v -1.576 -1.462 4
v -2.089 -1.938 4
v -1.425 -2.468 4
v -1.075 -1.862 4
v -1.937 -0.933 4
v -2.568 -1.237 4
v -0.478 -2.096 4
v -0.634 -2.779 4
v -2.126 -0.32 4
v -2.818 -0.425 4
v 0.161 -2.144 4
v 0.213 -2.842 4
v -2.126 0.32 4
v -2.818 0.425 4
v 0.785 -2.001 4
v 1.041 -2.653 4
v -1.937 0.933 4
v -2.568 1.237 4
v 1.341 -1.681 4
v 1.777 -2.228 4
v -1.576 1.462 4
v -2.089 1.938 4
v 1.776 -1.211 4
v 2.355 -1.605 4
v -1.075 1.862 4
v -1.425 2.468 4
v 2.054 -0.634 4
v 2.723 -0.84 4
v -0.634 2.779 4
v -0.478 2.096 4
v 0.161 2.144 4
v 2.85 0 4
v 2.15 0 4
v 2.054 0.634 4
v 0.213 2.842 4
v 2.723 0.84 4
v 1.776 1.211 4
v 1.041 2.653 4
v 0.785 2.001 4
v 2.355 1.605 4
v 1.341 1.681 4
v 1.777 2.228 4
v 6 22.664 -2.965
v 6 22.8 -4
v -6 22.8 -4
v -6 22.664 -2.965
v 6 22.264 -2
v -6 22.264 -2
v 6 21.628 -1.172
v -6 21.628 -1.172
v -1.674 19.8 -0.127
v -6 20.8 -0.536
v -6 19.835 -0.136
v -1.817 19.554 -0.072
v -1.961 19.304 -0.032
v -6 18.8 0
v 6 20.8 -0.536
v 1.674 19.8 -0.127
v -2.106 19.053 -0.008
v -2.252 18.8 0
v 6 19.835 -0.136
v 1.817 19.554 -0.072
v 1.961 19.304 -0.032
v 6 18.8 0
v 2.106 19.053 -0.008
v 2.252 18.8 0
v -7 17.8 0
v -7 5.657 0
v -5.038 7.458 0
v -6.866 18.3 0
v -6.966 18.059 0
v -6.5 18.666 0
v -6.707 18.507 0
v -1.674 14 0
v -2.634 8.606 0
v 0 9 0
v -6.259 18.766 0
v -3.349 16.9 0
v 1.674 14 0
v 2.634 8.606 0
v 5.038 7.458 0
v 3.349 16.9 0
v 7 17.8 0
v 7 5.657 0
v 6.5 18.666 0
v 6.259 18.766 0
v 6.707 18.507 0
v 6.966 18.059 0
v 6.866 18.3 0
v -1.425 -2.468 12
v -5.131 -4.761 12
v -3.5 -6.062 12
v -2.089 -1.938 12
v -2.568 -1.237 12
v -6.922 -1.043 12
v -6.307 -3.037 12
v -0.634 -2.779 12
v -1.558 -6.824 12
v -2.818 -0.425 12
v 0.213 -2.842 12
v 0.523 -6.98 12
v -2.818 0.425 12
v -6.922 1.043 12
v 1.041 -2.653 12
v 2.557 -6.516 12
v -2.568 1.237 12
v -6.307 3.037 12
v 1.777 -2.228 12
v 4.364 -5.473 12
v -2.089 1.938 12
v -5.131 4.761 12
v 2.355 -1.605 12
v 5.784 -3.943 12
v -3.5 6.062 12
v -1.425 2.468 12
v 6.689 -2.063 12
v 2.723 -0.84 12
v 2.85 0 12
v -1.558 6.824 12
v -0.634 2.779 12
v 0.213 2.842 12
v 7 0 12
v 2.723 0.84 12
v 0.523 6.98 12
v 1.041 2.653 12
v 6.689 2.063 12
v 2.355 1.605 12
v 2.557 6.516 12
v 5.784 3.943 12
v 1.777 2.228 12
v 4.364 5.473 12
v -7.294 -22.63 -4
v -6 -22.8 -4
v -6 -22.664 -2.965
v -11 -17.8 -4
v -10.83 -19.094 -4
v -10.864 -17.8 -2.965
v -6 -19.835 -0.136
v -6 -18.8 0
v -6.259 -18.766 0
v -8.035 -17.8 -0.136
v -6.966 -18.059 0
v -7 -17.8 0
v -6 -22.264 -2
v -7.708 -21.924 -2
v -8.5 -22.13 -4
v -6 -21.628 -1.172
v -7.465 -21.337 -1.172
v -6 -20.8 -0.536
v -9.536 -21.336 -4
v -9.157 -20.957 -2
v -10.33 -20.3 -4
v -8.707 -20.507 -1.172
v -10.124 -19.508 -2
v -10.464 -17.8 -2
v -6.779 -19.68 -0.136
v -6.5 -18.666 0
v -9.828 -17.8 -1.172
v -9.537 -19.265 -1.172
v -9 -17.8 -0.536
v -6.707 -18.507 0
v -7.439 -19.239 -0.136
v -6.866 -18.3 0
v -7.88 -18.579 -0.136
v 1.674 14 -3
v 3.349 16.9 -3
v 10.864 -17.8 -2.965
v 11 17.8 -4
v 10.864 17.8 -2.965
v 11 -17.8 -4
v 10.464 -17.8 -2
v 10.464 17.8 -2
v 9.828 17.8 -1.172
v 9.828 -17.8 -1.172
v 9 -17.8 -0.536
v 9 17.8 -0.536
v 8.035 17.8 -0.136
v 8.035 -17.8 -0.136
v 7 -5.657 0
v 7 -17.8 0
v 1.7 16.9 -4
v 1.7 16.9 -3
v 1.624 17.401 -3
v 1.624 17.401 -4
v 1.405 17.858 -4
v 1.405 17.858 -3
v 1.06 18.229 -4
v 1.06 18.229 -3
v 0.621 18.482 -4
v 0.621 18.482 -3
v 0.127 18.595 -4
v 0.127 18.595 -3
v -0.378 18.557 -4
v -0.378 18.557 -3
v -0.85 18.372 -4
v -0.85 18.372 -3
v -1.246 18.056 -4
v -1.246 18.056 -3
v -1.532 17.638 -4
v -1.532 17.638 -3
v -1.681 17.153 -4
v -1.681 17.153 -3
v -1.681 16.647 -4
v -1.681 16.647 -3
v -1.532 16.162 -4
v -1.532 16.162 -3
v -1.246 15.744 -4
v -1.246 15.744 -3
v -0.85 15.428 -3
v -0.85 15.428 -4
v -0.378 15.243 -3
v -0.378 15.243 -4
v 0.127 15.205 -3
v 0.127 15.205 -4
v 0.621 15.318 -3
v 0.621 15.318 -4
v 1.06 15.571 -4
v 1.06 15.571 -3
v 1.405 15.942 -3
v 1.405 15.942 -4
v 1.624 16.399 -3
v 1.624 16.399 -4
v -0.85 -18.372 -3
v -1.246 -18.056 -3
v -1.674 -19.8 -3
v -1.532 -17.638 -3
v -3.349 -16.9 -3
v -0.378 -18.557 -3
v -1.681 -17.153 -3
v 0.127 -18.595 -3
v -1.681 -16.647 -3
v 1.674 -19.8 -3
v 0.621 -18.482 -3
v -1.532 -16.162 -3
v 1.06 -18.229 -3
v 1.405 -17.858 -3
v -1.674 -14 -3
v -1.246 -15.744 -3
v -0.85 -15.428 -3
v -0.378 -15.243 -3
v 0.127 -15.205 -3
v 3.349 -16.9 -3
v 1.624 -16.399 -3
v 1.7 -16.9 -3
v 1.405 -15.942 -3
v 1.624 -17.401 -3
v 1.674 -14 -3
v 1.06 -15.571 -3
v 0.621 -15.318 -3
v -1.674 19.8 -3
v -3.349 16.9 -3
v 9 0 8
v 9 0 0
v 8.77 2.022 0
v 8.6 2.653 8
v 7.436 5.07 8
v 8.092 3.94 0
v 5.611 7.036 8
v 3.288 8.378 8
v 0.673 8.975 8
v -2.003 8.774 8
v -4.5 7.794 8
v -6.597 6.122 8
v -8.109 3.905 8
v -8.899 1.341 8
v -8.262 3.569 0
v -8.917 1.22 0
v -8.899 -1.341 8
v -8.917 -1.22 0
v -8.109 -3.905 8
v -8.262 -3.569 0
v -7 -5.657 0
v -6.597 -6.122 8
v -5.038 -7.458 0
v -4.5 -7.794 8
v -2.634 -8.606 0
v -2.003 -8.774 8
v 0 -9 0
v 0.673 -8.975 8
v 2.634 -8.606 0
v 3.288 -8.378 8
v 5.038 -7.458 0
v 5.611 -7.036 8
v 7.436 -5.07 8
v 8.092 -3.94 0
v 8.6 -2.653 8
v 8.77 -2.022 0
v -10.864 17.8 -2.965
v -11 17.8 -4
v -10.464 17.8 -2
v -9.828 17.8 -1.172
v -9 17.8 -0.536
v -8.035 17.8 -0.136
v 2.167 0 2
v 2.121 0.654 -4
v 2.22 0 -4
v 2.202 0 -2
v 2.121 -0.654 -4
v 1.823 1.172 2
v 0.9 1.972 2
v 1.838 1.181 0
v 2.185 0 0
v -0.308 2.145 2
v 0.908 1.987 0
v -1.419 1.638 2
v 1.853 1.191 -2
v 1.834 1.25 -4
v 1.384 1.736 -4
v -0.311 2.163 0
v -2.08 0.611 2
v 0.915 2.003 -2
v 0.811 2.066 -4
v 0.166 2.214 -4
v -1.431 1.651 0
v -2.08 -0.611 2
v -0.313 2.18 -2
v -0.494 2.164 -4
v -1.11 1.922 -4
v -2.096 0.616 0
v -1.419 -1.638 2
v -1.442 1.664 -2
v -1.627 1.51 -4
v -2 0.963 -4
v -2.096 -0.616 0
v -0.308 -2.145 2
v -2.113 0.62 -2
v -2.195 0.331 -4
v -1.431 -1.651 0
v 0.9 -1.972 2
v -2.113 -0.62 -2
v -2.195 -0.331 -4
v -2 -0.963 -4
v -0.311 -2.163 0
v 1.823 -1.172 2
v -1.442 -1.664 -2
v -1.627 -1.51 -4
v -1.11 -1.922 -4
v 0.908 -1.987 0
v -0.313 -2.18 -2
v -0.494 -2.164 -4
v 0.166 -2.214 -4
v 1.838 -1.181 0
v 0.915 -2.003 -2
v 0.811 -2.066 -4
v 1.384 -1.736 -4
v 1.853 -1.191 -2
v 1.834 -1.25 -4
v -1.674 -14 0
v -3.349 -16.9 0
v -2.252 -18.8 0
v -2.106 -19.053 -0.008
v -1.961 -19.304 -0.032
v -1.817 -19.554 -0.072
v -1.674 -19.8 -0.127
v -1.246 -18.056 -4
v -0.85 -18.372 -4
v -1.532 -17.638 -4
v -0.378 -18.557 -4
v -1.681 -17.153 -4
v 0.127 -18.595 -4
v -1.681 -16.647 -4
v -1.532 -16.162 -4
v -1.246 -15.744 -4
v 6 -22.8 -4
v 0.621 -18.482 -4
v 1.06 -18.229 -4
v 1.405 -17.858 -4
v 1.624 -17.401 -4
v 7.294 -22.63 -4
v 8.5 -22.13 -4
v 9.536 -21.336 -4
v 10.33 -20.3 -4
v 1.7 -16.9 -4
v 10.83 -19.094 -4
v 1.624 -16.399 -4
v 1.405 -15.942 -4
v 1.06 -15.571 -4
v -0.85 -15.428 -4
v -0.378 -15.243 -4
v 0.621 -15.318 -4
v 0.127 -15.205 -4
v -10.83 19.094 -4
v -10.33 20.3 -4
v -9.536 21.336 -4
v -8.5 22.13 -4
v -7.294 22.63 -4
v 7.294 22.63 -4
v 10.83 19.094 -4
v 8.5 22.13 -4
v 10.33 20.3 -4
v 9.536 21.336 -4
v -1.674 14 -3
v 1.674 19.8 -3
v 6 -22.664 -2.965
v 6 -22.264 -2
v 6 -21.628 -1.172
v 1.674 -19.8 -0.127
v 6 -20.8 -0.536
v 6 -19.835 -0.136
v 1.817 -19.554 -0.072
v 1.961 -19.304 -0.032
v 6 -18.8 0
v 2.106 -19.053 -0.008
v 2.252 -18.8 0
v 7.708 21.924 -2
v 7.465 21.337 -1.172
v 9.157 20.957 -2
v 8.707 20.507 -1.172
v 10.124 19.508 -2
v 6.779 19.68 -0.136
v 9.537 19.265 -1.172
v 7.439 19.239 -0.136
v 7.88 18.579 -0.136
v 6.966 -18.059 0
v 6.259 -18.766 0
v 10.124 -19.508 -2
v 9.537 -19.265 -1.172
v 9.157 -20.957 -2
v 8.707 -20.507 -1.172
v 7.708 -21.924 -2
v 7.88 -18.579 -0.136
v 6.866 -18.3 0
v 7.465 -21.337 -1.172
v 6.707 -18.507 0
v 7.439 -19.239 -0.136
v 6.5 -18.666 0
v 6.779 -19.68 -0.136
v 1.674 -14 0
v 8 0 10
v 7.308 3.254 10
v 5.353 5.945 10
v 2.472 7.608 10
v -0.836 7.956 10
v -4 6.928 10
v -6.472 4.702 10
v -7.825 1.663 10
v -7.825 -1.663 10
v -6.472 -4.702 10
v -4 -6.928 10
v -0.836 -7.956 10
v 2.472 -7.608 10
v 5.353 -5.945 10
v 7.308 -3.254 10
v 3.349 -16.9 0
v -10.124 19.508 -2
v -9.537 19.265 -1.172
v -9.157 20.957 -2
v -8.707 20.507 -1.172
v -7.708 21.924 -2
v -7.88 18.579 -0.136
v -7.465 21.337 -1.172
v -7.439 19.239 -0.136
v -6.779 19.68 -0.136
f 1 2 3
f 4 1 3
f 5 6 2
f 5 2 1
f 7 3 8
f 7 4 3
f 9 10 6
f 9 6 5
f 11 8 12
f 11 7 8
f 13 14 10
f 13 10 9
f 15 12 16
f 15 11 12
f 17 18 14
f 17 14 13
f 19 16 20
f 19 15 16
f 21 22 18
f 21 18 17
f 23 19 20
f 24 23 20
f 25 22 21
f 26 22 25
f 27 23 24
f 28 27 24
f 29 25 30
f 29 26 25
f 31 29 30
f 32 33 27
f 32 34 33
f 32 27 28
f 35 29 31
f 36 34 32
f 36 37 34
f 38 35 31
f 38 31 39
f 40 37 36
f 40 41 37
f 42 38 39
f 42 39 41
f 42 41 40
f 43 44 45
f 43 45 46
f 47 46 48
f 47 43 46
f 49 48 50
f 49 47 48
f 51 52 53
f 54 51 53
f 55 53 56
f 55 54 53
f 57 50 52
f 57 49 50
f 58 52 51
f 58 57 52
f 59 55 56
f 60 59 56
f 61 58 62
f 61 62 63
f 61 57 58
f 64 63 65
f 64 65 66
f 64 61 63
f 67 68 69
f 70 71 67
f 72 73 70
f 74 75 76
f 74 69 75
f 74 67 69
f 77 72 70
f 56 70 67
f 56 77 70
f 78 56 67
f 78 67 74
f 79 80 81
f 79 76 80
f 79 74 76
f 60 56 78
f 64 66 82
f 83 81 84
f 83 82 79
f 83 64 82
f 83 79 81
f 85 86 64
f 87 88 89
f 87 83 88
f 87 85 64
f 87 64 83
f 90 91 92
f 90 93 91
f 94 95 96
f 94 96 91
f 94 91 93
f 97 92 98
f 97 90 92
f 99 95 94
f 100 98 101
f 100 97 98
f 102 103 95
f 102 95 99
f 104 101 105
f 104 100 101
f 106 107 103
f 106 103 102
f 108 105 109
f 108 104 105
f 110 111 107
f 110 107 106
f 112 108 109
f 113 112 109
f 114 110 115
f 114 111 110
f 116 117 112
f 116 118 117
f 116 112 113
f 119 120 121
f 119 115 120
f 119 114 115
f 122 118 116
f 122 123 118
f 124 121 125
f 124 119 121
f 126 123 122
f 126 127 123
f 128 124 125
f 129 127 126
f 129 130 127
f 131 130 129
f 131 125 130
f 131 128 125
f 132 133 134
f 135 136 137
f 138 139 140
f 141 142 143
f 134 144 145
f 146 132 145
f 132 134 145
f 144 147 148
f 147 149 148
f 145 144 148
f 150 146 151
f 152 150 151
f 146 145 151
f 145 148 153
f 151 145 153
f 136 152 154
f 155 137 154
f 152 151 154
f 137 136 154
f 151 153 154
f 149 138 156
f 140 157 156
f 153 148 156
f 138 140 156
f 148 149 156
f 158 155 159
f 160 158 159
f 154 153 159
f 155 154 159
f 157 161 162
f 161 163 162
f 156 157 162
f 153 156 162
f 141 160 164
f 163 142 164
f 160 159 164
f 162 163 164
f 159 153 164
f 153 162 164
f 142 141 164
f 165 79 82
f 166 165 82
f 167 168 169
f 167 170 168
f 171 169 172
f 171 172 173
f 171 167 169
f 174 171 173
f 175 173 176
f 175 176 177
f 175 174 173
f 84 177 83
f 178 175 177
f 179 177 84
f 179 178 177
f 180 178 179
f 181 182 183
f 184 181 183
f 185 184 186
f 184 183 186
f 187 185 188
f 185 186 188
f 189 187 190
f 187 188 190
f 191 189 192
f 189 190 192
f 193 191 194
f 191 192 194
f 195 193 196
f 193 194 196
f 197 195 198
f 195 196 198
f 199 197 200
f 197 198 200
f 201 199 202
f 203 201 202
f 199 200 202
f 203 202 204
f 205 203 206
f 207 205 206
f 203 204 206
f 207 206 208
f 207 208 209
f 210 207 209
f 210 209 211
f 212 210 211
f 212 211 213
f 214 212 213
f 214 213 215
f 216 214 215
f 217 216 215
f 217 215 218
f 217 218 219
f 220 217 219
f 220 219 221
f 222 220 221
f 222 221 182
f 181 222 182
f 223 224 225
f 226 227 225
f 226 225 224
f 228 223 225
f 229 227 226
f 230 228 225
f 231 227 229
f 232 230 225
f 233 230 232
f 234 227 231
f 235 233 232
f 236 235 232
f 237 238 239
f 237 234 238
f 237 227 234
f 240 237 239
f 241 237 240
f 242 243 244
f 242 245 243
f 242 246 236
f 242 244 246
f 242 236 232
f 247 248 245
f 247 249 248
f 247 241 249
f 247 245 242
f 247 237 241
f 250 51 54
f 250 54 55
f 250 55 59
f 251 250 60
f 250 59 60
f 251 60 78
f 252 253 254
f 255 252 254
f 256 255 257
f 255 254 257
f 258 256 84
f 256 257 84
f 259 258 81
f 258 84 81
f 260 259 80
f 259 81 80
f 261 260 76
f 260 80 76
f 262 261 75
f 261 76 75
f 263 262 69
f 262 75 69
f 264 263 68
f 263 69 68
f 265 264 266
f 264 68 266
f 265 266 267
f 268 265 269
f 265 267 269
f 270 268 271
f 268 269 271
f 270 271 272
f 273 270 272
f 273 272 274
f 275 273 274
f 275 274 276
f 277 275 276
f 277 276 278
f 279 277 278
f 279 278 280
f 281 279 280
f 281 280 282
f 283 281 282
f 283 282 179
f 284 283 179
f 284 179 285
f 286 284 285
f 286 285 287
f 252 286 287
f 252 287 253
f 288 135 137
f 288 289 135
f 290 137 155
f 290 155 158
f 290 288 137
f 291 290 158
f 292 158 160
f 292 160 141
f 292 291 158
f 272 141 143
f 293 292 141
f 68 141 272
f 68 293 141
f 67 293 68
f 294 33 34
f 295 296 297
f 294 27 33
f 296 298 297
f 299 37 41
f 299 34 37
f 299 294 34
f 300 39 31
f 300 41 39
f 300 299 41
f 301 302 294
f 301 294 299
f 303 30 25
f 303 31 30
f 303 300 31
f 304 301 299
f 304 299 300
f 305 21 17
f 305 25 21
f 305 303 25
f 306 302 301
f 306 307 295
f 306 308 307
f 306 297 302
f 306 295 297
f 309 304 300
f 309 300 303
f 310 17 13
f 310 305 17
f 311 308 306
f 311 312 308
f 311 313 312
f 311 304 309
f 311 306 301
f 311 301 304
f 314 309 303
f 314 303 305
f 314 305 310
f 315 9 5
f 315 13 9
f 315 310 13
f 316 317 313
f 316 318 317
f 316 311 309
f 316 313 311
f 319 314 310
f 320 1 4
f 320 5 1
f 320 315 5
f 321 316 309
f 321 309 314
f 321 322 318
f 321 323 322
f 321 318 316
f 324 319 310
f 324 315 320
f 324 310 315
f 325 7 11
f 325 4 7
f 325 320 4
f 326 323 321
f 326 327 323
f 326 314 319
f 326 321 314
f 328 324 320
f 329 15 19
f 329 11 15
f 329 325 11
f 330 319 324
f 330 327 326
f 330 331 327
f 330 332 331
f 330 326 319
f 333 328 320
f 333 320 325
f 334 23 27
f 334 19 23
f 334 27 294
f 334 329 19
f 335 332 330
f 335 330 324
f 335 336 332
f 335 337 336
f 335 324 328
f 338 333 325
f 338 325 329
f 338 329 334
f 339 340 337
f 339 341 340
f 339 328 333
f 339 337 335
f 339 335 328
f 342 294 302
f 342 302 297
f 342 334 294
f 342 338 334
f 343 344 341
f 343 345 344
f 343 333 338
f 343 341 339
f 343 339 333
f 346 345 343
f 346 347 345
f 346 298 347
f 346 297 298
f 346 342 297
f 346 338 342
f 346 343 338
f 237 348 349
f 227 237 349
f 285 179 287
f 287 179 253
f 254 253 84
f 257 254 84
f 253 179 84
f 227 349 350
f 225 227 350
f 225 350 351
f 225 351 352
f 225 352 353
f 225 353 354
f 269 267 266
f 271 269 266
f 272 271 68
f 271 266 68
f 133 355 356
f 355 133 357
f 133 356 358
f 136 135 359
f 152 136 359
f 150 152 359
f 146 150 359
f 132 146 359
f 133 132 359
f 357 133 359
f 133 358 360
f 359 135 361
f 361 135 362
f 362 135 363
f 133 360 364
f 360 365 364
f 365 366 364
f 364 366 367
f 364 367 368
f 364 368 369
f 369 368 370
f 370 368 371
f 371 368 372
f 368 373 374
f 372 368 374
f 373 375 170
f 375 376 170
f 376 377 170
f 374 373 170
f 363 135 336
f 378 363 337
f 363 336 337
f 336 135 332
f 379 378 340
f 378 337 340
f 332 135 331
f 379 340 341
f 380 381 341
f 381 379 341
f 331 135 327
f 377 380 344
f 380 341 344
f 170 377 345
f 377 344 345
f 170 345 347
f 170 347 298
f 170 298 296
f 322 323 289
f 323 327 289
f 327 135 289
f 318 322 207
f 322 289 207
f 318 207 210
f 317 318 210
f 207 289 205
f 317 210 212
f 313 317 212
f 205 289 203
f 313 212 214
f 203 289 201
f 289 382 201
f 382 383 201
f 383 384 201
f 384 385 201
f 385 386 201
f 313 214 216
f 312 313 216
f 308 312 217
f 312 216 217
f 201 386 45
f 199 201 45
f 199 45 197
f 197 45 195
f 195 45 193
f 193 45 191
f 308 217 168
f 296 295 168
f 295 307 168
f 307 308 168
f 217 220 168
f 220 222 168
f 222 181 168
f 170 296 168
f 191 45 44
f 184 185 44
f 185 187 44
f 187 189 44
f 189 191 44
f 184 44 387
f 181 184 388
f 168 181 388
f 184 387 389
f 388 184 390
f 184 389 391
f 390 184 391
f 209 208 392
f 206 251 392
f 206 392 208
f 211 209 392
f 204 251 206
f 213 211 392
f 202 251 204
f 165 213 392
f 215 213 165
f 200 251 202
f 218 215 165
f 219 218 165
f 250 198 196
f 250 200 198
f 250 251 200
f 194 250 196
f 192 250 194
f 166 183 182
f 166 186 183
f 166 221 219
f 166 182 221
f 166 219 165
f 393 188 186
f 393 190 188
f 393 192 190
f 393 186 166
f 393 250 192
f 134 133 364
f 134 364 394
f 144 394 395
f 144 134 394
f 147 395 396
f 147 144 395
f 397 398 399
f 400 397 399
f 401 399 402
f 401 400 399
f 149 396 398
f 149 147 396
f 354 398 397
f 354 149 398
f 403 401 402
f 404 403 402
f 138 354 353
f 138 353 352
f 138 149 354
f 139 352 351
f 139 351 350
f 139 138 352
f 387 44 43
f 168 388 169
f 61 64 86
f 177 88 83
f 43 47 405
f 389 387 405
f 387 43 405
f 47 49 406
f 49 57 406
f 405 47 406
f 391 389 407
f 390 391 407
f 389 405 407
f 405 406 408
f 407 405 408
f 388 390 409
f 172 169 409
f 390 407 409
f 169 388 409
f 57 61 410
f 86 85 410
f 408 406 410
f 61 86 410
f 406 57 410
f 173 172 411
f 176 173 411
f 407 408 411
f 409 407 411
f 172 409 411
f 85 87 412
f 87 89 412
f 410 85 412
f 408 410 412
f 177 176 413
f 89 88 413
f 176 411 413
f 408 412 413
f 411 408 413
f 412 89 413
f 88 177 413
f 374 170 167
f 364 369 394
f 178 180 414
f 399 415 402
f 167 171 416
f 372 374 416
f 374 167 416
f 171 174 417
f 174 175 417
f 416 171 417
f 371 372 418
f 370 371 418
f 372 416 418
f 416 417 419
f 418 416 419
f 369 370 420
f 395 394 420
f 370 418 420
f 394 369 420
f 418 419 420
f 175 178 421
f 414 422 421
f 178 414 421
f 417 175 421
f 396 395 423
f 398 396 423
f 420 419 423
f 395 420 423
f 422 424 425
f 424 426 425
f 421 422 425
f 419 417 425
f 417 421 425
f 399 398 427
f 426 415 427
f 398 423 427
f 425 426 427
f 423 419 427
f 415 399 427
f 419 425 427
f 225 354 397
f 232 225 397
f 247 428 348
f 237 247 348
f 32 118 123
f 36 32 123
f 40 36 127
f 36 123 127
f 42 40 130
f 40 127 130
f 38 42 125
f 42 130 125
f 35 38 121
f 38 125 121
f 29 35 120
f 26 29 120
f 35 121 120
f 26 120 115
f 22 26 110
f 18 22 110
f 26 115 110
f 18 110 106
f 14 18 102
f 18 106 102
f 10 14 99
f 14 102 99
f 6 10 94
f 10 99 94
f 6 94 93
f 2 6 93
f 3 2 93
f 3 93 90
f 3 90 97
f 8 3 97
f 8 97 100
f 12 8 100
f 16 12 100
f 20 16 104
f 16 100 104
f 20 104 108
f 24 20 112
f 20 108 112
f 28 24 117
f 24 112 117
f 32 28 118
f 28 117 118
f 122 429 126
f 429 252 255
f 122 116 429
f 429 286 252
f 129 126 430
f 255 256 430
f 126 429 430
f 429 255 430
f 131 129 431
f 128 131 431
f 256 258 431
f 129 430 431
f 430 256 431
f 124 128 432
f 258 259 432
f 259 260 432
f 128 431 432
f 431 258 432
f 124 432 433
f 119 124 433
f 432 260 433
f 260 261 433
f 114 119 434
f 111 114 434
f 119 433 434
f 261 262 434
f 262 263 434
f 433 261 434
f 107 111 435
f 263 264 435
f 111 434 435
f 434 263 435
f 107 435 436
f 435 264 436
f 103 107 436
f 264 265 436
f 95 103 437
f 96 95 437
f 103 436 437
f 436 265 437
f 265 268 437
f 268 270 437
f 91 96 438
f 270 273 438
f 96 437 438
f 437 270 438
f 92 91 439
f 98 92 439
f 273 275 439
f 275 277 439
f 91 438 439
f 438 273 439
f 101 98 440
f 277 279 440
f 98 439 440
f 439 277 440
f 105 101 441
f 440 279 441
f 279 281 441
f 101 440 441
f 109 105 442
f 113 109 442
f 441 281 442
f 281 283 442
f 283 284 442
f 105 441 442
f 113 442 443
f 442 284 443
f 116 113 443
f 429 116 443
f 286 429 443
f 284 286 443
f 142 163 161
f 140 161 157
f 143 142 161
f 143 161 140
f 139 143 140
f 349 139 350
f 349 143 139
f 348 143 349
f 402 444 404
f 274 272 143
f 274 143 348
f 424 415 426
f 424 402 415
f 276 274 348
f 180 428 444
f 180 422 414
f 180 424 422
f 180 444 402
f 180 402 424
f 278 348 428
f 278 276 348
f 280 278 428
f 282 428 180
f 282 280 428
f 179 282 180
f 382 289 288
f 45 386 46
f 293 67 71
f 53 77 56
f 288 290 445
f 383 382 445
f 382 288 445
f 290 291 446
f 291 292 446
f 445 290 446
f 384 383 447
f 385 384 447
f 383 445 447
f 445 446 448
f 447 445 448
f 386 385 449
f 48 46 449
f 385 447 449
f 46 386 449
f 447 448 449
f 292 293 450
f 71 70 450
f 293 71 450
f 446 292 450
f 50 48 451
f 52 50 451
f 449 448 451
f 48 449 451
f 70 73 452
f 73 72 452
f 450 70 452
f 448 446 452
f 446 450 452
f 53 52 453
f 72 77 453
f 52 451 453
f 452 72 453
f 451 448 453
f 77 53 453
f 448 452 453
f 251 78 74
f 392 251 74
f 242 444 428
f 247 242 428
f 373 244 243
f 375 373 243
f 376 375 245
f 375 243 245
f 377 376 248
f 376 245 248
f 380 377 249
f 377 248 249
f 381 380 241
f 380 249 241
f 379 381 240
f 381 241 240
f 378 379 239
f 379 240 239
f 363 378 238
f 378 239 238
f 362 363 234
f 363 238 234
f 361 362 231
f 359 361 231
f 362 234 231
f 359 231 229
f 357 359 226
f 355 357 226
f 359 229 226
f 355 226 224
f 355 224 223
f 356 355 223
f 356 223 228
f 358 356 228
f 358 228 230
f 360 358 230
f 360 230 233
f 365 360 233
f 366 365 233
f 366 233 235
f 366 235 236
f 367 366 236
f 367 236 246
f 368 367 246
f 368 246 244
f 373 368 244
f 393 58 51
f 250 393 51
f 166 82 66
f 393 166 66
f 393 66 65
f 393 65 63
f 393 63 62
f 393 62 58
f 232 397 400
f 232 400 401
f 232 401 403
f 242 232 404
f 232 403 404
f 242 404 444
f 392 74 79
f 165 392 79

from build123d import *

# Parameters (mm, degrees)
F2_W      = 22
F2_H      = 45.6
F2_R      = 1.7
F3_DEPTH  = 4
F4_R      = 5
F5_R      = 3.99999
F6_DEPTH  = 3
F8_R      = 9
F9_DEPTH  = 12
F10_R     = 2.85
F11_DEPTH = 8
F12_R     = 2.15
F13_DEPTH = 8
F13_TAPER = -0.5
F14_SIZE2 = 4
F14_SIZE  = 2


# Not quite as in the source:
# - a fillet or chamfer is up to 0.001 mm smaller than in the source, because OpenCascade refuses the exact size
# - a feature names something its author has since deleted; it is built from what else it names


with BuildPart() as f3:
    # F2 (on Top) → F3 (new body)
    with BuildSketch(Plane.XY):
        Rectangle(F2_W, F2_H)
        Polygon((3.3486315613, -16.9), (1.6743157806, -19.8), (-1.6743157806, -19.8), (-3.3486315613, -16.9), (-1.6743157806, -14), (1.6743157806, -14), align=None, mode=Mode.SUBTRACT)
        Circle(F2_R, mode=Mode.SUBTRACT)
        Polygon((1.6743157806, 19.8), (3.3486315613, 16.9), (1.6743157806, 14), (-1.6743157806, 14), (-3.3486315613, 16.9), (-1.6743157806, 19.8), align=None, mode=Mode.SUBTRACT)
        Polygon((1.6743157806, 14), (3.3486315613, 16.9), (1.6743157806, 19.8), (-1.6743157806, 19.8), (-3.3486315613, 16.9), (-1.6743157806, 14), align=None)
        with Locations((0, 16.9)):
            Circle(F2_R, mode=Mode.SUBTRACT)
        Circle(F2_R)
        Polygon((-1.6743157806, -19.8), (1.6743157806, -19.8), (3.3486315613, -16.9), (1.6743157806, -14), (-1.6743157806, -14), (-3.3486315613, -16.9), align=None)
        with Locations((0, -16.9)):
            Circle(F2_R, mode=Mode.SUBTRACT)
    extrude(amount=-F3_DEPTH)

    # F4
    f4_edges = [f3.edges().sort_by_distance(p)[0] for p in [
        (-11, 22.8, -2),
        (11, 22.8, -2),
        (11, -22.8, -2),
        (-11, -22.8, -2),
    ]]
    fillet(f4_edges, radius=F4_R)

    # F5 (radius 4 in the source; OpenCascade refuses exactly that, so slightly less here)
    f5_edges = [f3.edges().sort_by_distance(p)[0] for p in [
        (-11, 0, 0),
        (0, -22.8, 0),
        (-9.535534, -21.335534, 0),
        (9.535534, -21.335534, 0),
        (11, 0, 0),
        (9.535534, 21.335534, 0),
        (0, 22.8, 0),
        (-9.535534, 21.335534, 0),
    ]]
    fillet(f5_edges, radius=F5_R)

    # F2 (on Top) → F6 (cut)
    with BuildSketch(Plane.XY):
        Polygon((1.6743157806, 14), (3.3486315613, 16.9), (1.6743157806, 19.8), (-1.6743157806, 19.8), (-3.3486315613, 16.9), (-1.6743157806, 14), align=None)
        with Locations((0, 16.9)):
            Circle(F2_R, mode=Mode.SUBTRACT)
        Polygon((-1.6743157806, -19.8), (1.6743157806, -19.8), (3.3486315613, -16.9), (1.6743157806, -14), (-1.6743157806, -14), (-3.3486315613, -16.9), align=None)
        with Locations((0, -16.9)):
            Circle(F2_R, mode=Mode.SUBTRACT)
    extrude(amount=-F6_DEPTH, mode=Mode.SUBTRACT)

    # F8 (on line) → F9 (join)
    with BuildSketch(Plane.XY):
        Circle(F8_R)
    extrude(amount=F9_DEPTH)

    # F10 (on face) → F11 (cut)
    with BuildSketch(Plane.XY.offset(12)):
        Circle(F10_R)
    extrude(amount=-F11_DEPTH, mode=Mode.SUBTRACT)

    # F12 (on face) → F13 (cut, through all)
    with BuildSketch(Plane.XY.offset(4)):
        Circle(F12_R)
    extrude(amount=-F13_DEPTH, taper=F13_TAPER, mode=Mode.SUBTRACT)

    # F14
    f14_edges = [f3.edges().sort_by_distance(p)[0] for p in [
        (-9, 0, 12),
    ]]
    f14_side = f3.faces().sort_by_distance((-8.745442, 0, 12))[0]
    chamfer(f14_edges, length=F14_SIZE, length2=F14_SIZE2, reference=f14_side)


solid = f3.part
